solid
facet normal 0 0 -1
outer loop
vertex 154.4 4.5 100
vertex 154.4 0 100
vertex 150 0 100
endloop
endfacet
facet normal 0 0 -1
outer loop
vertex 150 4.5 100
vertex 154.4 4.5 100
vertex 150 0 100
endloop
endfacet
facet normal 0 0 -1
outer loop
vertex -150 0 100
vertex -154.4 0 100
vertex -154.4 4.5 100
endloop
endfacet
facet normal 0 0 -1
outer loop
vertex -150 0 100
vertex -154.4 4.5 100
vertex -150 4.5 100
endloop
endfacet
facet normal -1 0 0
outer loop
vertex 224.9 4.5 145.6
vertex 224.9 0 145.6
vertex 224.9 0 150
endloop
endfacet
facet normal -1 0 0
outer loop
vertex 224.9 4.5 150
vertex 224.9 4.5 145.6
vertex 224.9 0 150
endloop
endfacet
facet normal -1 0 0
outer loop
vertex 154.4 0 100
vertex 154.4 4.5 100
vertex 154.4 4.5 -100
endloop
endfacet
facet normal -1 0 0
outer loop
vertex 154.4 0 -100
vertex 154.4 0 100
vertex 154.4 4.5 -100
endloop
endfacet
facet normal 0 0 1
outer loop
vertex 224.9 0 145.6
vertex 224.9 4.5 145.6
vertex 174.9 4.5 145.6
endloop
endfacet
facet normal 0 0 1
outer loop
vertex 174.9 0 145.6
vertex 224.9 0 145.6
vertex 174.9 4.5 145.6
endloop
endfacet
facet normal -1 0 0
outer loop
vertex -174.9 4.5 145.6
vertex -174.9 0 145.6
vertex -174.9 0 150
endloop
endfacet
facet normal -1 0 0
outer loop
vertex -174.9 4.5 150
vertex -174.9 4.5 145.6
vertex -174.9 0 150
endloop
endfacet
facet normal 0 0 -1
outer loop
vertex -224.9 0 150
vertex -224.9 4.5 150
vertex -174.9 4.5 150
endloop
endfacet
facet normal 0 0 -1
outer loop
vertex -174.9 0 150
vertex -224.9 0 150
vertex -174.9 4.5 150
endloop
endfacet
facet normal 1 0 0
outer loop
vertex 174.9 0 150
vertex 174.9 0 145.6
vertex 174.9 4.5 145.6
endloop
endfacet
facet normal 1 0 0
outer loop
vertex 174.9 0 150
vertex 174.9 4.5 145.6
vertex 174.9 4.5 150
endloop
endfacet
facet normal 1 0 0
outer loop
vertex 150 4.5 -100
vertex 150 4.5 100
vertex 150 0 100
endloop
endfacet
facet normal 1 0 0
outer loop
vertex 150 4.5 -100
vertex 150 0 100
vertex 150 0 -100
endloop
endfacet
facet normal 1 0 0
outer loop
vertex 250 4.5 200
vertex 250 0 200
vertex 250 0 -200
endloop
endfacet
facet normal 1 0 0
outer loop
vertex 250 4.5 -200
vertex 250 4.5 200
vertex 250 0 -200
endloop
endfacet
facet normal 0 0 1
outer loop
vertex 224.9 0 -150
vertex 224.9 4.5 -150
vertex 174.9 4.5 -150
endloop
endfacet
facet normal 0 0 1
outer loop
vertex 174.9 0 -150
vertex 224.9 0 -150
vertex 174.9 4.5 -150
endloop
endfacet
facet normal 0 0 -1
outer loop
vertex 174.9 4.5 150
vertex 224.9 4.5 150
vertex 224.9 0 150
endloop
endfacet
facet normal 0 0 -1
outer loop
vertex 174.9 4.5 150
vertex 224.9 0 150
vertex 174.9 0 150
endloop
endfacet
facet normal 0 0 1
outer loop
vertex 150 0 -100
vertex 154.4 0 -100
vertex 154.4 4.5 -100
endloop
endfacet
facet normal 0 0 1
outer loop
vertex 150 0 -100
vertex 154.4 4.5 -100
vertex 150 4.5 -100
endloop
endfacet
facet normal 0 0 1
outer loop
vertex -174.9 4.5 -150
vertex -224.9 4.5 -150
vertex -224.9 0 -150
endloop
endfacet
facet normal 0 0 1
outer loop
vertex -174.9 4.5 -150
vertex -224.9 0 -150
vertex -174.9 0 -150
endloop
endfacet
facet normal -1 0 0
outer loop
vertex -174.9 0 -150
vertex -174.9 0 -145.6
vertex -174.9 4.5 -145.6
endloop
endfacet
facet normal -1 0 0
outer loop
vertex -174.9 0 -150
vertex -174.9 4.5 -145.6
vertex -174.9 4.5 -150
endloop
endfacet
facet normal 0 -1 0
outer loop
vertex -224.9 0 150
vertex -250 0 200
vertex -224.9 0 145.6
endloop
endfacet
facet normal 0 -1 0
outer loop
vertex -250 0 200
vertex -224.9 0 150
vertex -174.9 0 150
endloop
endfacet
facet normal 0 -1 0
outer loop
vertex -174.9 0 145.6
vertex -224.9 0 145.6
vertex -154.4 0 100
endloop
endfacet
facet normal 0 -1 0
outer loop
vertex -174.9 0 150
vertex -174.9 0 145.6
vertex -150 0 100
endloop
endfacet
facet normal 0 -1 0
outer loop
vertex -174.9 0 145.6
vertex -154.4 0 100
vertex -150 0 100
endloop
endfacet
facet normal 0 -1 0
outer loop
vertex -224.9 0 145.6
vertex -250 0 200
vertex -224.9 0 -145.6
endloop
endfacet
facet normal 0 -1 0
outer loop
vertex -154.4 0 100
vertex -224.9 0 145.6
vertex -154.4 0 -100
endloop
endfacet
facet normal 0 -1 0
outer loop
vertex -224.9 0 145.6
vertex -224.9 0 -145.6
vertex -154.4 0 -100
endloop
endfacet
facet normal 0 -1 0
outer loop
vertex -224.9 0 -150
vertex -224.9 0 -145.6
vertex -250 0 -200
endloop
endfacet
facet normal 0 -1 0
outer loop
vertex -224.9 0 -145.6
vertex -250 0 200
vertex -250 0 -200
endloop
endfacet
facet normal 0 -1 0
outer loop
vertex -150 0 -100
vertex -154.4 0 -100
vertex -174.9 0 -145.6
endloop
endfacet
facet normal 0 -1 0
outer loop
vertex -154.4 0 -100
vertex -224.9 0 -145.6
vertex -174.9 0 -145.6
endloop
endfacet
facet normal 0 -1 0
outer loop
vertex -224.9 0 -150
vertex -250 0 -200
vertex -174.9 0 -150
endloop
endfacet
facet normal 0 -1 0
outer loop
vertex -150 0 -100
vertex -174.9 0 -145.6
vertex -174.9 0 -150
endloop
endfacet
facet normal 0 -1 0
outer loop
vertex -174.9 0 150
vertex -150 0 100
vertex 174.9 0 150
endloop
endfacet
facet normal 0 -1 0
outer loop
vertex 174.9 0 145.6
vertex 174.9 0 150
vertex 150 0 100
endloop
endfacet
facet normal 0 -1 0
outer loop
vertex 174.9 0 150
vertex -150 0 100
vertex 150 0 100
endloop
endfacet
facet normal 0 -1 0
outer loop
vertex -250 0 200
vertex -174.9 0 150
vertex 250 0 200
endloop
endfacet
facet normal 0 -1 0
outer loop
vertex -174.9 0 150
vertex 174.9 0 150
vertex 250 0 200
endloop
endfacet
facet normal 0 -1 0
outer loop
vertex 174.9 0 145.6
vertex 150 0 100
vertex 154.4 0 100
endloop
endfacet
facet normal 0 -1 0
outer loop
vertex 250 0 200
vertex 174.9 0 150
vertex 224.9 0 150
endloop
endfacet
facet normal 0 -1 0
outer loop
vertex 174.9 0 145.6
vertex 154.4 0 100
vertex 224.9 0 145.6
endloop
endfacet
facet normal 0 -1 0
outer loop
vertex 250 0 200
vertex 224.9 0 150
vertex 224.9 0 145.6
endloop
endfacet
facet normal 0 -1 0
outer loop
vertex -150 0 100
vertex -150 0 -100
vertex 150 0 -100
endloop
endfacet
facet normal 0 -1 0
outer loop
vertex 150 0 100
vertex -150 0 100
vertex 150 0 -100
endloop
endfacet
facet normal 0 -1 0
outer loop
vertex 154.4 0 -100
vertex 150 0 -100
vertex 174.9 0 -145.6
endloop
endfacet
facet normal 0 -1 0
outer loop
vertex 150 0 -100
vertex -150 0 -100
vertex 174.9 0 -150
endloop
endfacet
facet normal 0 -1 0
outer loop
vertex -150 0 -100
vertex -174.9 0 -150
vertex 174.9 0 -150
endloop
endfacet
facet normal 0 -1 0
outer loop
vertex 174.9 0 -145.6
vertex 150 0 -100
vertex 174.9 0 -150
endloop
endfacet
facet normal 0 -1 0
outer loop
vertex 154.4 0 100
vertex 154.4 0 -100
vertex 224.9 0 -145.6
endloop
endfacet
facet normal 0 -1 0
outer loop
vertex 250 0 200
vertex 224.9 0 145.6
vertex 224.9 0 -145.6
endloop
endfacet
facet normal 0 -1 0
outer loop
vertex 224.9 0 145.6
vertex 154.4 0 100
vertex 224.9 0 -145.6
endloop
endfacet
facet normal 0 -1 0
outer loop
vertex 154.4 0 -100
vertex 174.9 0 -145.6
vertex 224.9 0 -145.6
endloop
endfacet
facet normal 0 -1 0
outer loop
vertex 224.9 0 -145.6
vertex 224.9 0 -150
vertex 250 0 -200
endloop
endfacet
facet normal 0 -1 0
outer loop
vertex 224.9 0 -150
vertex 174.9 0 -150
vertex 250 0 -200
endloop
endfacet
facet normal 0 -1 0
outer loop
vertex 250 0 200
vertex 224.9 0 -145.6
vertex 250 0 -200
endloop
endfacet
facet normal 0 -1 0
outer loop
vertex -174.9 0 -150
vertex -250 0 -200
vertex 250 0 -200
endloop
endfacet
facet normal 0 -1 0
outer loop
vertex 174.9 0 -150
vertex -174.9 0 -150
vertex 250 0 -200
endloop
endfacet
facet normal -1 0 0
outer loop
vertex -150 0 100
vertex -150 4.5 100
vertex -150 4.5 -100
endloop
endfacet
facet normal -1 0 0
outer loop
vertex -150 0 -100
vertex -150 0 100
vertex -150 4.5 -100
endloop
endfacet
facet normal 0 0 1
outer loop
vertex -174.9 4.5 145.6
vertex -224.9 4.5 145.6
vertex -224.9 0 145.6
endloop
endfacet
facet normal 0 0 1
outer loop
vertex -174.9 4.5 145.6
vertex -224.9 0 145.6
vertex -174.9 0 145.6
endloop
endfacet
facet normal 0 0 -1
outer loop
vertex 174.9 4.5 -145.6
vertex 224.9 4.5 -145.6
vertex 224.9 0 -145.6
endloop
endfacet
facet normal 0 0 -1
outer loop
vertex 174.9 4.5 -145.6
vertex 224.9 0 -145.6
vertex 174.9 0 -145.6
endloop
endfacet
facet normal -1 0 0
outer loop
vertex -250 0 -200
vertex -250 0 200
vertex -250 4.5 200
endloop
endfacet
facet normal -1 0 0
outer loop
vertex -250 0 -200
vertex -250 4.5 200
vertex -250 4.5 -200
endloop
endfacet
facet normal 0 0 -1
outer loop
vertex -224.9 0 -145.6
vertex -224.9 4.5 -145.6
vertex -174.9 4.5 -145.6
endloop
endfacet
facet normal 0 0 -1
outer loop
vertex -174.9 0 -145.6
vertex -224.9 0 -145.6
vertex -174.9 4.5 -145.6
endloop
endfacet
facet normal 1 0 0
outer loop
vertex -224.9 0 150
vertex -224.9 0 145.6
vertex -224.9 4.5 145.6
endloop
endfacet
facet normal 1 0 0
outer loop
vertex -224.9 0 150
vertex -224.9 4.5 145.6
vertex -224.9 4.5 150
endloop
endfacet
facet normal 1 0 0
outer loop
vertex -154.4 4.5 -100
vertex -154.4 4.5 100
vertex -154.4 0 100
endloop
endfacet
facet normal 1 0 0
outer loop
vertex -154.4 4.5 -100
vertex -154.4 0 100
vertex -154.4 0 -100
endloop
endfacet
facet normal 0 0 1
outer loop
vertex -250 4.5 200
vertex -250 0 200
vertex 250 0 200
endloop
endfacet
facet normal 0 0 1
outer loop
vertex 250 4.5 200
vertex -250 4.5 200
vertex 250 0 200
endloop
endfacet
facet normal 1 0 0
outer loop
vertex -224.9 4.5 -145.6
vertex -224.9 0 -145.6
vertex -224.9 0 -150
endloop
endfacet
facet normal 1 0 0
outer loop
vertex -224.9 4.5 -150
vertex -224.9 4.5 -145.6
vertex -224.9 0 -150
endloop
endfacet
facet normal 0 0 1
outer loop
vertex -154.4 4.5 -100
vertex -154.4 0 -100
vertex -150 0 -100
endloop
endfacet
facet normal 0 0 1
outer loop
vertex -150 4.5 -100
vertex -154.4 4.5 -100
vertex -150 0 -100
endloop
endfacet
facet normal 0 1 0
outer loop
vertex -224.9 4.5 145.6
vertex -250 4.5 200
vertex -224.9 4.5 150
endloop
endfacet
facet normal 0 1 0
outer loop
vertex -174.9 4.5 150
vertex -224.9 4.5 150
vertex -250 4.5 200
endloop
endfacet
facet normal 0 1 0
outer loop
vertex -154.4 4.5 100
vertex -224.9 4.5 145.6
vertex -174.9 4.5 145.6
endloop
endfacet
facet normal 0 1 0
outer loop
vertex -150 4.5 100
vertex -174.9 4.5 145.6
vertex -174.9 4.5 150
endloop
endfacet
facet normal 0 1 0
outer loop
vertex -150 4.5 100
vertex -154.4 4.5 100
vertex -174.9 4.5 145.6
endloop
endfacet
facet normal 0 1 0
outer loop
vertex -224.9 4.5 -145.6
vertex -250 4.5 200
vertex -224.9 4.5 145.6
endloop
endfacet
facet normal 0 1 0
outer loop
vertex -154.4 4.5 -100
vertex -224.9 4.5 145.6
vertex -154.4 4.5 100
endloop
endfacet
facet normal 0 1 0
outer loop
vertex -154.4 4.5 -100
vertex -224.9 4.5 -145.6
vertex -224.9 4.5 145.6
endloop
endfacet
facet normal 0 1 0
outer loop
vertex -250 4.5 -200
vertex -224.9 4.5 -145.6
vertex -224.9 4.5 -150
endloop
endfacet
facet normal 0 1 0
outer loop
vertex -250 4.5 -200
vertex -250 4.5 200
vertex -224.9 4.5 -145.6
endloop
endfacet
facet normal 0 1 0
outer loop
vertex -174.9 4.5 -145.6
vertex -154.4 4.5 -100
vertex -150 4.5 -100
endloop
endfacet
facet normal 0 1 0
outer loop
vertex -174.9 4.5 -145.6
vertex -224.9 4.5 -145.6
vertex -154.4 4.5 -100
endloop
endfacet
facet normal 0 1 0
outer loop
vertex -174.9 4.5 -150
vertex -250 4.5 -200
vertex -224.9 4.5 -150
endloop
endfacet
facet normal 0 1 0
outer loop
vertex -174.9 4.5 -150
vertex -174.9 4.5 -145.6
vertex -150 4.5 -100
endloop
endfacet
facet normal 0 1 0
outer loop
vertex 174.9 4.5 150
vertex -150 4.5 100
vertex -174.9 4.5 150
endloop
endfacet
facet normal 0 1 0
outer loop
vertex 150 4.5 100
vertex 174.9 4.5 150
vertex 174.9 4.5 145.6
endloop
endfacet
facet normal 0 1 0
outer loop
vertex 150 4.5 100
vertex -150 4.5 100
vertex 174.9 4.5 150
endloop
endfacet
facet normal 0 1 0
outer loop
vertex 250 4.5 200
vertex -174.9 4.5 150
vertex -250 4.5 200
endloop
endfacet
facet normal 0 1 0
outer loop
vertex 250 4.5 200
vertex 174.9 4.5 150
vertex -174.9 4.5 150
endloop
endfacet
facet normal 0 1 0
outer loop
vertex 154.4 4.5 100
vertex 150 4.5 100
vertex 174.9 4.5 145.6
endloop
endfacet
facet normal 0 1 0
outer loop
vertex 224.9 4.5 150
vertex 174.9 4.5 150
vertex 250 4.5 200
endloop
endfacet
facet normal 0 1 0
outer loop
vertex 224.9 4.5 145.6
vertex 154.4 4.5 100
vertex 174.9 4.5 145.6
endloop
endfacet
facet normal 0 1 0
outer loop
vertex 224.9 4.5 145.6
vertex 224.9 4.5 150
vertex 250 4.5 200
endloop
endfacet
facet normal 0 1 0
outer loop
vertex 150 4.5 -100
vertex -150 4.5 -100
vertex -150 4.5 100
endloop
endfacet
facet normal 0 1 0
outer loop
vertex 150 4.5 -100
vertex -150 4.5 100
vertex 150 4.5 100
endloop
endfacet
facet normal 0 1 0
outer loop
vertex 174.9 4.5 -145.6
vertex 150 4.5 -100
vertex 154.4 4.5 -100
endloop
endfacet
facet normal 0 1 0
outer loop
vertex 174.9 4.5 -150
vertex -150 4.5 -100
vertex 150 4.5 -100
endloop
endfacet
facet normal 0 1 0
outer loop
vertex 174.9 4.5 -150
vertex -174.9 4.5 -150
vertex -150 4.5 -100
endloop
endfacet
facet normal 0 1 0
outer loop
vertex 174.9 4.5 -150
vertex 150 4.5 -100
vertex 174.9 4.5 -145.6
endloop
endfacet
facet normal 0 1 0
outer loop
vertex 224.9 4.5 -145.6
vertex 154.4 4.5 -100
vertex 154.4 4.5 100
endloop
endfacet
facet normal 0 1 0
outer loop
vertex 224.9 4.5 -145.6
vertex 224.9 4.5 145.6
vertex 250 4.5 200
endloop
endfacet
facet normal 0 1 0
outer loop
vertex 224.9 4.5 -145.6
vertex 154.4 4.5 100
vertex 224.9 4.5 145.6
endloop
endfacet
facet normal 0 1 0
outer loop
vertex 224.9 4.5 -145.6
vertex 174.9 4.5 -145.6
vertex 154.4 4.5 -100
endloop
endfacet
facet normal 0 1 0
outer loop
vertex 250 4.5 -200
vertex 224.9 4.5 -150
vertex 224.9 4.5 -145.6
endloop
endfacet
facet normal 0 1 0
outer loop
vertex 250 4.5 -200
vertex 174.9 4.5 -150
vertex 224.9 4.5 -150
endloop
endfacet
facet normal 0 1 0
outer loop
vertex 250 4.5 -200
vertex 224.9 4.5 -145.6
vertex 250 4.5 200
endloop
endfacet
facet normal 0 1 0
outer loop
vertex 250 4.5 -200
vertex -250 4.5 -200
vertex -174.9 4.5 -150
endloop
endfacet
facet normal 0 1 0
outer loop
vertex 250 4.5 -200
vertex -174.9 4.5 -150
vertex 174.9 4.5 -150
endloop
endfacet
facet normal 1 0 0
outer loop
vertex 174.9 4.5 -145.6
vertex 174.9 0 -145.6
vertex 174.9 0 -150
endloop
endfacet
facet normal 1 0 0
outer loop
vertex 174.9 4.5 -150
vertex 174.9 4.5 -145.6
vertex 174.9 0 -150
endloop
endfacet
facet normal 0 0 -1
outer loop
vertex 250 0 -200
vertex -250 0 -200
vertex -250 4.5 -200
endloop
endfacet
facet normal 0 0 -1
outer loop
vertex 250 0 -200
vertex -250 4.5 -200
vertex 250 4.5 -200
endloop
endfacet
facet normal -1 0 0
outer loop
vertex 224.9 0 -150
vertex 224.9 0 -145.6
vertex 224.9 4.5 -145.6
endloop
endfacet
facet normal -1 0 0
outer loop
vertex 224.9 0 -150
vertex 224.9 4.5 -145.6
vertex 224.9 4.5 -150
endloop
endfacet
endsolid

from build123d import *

# Parameters (mm, degrees)
SKETCH1_W                                  = 500
SKETCH1_H                                  = 400
BOSS_EXTRUDE1_DEPTH                        = 4.5
SKETCH2_W                                  = 4.4
SKETCH2_H                                  = 200
CUT_EXTRUDE1_DEPTH                         = 4.5
SKETCH5_W                                  = 50
SKETCH5_H                                  = 4.4
CUT_EXTRUDE2_DEPTH                         = 4.5
MIRROR5_AT_THE_SECOND_PLANE_COPY_1_SKETC_W = 50
MIRROR5_AT_THE_SECOND_PLANE_COPY_1_SKETC_H = 4.4
MIRROR5_AT_THE_SECOND_PLANE_COPY_1_DEPTH   = 4.5


with BuildPart() as part:
    # Sketch1 → Boss-Extrude1 (new body)
    with BuildSketch(Plane(origin=(0, 0, 0), x_dir=(1, 0, 0), z_dir=(0, 1, 0))):
        Rectangle(SKETCH1_W, SKETCH1_H)
    extrude(amount=BOSS_EXTRUDE1_DEPTH)

    # Sketch2 → Cut-Extrude1 (cut)
    with BuildSketch(Plane(origin=(0, 4.5, 0), x_dir=(1, 0, 0), z_dir=(0, 1, 0))):
        with Locations((-152.2, 0)):
            Rectangle(SKETCH2_W, SKETCH2_H)
    cut_extrude1 = extrude(amount=-CUT_EXTRUDE1_DEPTH, mode=Mode.SUBTRACT)

    # Mirror2: Cut-Extrude1 across plane
    add(cut_extrude1.mirror(Plane(origin=(0, 0, 0), x_dir=(0, 0, 1), z_dir=(1, 0, 0))), mode=Mode.SUBTRACT)

    # Sketch5 → Cut-Extrude2 (cut)
    with BuildSketch(Plane(origin=(0, 4.5, 0), x_dir=(1, 0, 0), z_dir=(0, 1, 0))):
        with Locations((-199.9, 147.8)):
            Rectangle(SKETCH5_W, SKETCH5_H)
    cut_extrude2 = extrude(amount=-CUT_EXTRUDE2_DEPTH, mode=Mode.SUBTRACT)

    # Mirror5: Cut-Extrude2 across plane
    add(cut_extrude2.mirror(Plane.XY), mode=Mode.SUBTRACT)

    # Mirror5 at the second plane: Cut-Extrude2 across plane
    add(cut_extrude2.mirror(Plane(origin=(0, 0, 0), x_dir=(0, 0, 1), z_dir=(1, 0, 0))), mode=Mode.SUBTRACT)

    # Mirror5 at the second plane copy 1 sketc → Mirror5 at the second plane copy 1 (cut)
    with BuildSketch(Plane(origin=(0, 4.5, 0), x_dir=(-1, 0, 0), z_dir=(0, 1, 0))):
        with Locations((-199.9, 147.8)):
            Rectangle(MIRROR5_AT_THE_SECOND_PLANE_COPY_1_SKETC_W, MIRROR5_AT_THE_SECOND_PLANE_COPY_1_SKETC_H)
    extrude(amount=-MIRROR5_AT_THE_SECOND_PLANE_COPY_1_DEPTH, mode=Mode.SUBTRACT)


solid = part.part
